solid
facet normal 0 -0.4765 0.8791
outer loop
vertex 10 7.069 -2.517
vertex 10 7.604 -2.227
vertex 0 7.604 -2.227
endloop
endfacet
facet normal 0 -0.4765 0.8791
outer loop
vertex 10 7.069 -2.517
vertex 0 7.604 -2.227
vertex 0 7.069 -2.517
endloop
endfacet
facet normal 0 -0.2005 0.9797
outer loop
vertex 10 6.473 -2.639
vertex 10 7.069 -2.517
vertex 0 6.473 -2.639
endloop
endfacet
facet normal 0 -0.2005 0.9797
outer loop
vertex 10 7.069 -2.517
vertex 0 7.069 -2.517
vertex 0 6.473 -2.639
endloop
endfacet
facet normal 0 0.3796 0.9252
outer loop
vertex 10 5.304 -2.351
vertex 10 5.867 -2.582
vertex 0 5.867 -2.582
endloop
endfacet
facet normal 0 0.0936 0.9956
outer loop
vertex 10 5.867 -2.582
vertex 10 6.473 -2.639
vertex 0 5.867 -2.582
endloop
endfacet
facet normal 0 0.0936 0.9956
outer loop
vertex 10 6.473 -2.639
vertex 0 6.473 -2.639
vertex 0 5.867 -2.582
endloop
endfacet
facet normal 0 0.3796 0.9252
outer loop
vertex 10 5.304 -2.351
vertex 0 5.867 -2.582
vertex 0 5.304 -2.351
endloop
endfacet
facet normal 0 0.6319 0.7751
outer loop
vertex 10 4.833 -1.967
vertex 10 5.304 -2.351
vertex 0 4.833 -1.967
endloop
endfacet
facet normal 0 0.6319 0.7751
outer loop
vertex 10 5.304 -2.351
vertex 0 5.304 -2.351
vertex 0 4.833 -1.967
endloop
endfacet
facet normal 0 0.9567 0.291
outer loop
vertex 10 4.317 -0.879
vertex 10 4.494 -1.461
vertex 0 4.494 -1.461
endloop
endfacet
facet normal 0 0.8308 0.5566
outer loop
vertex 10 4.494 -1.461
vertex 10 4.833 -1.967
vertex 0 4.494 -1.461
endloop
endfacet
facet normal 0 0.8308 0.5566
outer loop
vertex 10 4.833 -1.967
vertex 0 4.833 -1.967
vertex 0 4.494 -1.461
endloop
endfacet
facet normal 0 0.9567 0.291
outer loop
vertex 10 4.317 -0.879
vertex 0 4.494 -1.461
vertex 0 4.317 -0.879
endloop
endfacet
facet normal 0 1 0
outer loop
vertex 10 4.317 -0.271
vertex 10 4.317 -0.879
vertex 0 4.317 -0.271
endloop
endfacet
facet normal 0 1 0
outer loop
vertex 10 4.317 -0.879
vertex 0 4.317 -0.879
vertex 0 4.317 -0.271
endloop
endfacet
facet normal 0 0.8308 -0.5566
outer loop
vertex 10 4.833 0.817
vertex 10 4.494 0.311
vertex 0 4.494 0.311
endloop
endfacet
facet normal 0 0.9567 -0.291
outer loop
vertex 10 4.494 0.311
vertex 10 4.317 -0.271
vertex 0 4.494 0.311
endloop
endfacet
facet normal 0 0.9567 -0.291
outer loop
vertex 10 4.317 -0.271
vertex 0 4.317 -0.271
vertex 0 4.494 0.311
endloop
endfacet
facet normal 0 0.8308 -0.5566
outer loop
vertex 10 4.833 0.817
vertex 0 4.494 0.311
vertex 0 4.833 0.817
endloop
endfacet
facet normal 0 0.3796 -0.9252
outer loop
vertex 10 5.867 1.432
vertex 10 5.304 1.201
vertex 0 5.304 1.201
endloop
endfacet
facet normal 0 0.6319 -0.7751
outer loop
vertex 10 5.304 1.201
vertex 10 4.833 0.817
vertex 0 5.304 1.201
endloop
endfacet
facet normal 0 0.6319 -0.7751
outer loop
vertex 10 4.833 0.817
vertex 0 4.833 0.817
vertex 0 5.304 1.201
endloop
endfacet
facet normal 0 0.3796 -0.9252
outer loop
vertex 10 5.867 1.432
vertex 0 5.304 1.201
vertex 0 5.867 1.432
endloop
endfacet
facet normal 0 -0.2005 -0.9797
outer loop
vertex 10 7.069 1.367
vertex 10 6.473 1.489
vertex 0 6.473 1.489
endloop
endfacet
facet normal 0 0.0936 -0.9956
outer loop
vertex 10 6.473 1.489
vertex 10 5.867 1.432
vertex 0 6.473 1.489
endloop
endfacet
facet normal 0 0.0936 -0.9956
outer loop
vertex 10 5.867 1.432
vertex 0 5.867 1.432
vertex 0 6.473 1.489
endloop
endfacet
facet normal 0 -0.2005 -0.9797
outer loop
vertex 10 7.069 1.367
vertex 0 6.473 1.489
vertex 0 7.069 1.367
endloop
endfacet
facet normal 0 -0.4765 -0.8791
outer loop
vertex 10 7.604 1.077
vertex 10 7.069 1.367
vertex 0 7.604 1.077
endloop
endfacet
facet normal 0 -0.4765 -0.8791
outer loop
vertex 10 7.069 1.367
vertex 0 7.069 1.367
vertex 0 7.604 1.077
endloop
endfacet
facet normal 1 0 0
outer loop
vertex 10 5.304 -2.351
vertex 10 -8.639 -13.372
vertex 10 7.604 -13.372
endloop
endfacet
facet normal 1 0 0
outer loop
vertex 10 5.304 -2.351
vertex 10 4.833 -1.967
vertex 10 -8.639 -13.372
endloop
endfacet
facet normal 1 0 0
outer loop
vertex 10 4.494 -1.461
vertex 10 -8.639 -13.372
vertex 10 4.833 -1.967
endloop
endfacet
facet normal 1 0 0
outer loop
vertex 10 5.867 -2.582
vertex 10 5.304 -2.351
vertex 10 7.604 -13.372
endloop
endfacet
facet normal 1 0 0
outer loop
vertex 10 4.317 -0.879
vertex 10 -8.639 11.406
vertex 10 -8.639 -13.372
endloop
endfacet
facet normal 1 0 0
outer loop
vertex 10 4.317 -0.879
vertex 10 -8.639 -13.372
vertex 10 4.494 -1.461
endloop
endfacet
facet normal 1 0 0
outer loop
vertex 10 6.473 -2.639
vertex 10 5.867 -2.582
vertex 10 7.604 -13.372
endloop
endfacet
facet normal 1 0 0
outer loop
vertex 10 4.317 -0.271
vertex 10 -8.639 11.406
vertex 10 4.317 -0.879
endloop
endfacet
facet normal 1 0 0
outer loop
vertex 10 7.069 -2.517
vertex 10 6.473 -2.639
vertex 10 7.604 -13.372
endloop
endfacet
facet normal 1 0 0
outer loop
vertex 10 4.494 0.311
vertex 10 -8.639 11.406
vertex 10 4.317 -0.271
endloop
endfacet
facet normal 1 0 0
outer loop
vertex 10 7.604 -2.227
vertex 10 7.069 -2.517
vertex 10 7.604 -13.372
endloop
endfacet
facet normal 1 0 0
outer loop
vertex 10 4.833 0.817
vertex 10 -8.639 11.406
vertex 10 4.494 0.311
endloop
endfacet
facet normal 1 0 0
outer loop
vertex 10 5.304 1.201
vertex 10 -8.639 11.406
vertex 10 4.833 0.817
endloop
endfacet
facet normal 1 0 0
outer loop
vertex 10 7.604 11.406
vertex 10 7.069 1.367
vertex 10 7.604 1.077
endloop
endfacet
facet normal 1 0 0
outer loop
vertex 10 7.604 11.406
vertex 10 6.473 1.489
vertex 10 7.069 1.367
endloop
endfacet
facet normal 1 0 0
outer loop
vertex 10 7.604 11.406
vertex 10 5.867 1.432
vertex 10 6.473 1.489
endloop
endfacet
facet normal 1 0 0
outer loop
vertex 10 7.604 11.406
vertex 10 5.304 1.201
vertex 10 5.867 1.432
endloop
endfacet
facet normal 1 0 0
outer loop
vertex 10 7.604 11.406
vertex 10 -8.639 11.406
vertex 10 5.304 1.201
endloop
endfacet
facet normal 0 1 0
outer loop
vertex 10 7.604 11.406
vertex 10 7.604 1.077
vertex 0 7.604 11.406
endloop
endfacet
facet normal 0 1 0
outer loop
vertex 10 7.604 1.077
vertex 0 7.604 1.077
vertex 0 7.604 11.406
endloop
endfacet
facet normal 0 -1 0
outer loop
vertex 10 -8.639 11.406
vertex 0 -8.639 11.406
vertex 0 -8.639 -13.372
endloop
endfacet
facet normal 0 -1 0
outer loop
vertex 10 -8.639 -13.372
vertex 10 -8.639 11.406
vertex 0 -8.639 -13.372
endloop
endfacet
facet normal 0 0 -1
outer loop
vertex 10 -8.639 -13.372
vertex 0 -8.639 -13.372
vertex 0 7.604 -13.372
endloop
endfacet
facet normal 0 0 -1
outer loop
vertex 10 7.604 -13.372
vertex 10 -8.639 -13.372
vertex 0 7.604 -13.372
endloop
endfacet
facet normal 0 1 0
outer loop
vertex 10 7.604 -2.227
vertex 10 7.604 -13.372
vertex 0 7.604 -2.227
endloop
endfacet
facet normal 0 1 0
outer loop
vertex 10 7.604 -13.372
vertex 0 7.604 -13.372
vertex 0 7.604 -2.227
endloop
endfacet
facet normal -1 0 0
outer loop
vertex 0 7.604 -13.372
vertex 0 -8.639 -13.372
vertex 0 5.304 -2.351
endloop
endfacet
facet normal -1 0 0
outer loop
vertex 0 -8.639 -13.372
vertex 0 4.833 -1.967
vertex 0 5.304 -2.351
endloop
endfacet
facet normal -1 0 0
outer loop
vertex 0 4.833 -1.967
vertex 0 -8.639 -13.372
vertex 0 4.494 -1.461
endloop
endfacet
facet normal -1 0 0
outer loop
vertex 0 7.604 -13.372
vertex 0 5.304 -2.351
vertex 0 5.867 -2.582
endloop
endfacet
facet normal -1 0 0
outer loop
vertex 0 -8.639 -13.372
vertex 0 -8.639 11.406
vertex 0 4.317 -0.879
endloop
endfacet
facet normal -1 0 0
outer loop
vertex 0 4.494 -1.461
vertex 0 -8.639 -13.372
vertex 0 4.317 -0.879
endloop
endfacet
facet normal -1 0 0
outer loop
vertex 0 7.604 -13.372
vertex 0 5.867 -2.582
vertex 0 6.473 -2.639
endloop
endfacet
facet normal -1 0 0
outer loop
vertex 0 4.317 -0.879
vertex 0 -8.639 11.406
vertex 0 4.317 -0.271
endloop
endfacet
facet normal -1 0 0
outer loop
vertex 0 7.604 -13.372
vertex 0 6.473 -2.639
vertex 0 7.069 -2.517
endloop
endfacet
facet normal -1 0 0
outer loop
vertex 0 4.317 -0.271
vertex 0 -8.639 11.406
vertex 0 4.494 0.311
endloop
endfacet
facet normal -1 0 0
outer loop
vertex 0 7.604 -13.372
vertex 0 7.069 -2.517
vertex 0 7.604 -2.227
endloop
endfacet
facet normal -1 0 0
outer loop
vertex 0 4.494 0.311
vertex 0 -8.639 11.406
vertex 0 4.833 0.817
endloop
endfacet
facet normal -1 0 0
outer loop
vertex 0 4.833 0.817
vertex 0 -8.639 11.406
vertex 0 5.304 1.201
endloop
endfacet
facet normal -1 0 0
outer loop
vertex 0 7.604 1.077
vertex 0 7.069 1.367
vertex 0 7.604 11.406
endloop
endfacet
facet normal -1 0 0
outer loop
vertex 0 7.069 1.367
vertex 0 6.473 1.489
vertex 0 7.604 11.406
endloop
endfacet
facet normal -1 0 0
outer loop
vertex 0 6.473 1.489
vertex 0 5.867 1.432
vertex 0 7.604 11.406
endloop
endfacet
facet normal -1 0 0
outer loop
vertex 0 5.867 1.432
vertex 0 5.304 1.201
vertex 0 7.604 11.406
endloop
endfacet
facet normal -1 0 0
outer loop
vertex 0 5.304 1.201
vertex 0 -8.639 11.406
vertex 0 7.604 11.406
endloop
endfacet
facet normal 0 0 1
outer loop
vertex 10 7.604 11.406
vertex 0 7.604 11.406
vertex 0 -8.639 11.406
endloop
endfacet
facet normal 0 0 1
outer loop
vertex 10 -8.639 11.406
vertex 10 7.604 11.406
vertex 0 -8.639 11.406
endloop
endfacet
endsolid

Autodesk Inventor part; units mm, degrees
ref_plane "YZ Plane" through (0, 0, 0) normal (1, 0, 0) x (0, 1, 0)
ref_plane "XZ Plane" through (0, 0, 0) normal (0, 1, 0) x (-1, 0, 0)
ref_plane "XY Plane" through (0, 0, 0) normal (0, 0, 1) x (1, 0, 0)
sketch "Boceto1" plane through (0, 0, 0) normal (1, 0, 0) x (0, 1, 0)
  line L0 (7.6041, 11.4062) -> (-8.6387, 11.4062)
  line L1 (-8.6387, 11.4062) -> (-8.6387, -13.3718)
  line L2 (-8.6387, -13.3718) -> (7.6041, -13.3718)
  line L3 (7.6041, -13.3718) -> (7.6041, 11.4062)
  point P0 (0, 0)
extrude "Extrusión1" add sketch "Boceto1" along normal blind 10
sketch "Boceto2" plane through (10, 0, 0) normal (1, 0, 0) x (0, 0, -1)
  line L0 (13.3718, -8.6387) -> (13.3718, 7.6041) projected
  line L1 (-11.4062, -8.6387) -> (13.3718, -8.6387) projected
  point P0 (0, 0)
  point P1 (0.575, 6.3613)
  point P2 (13.3718, -0.5173)
  dimension "d9" = 12.7969
  dimension "d10" = 15
hole "Agujero1" at (10, 6.3613, -0.575) direction (-1, 0, 0) diameter 4.134 end through all thread size "M5x0.8" class "6H" standard "ISO Metric profile"
equation "\"Radio_pliegue\" = Grosor"
equation "\"Anchura_desahogo_plegado\" = Grosor"
equation "\"Profundidad_desahogo_plegado\" = 0.5 * Grosor"
equation "\"Tamaño_destalonado\" = 4 * Grosor"
equation "\"Remanente_mínimo\" = 2 * Grosor"
equation "\"Radiodetransición\" = Radio_pliegue"
equation "\"Tamaño_de_radio_de_Jacobi\" = Radio_pliegue"
equation "\"TamañoSeparación\" = Grosor"
equation "\"Grosor\" = 0.5"
properties part number "Proyecto 1"
